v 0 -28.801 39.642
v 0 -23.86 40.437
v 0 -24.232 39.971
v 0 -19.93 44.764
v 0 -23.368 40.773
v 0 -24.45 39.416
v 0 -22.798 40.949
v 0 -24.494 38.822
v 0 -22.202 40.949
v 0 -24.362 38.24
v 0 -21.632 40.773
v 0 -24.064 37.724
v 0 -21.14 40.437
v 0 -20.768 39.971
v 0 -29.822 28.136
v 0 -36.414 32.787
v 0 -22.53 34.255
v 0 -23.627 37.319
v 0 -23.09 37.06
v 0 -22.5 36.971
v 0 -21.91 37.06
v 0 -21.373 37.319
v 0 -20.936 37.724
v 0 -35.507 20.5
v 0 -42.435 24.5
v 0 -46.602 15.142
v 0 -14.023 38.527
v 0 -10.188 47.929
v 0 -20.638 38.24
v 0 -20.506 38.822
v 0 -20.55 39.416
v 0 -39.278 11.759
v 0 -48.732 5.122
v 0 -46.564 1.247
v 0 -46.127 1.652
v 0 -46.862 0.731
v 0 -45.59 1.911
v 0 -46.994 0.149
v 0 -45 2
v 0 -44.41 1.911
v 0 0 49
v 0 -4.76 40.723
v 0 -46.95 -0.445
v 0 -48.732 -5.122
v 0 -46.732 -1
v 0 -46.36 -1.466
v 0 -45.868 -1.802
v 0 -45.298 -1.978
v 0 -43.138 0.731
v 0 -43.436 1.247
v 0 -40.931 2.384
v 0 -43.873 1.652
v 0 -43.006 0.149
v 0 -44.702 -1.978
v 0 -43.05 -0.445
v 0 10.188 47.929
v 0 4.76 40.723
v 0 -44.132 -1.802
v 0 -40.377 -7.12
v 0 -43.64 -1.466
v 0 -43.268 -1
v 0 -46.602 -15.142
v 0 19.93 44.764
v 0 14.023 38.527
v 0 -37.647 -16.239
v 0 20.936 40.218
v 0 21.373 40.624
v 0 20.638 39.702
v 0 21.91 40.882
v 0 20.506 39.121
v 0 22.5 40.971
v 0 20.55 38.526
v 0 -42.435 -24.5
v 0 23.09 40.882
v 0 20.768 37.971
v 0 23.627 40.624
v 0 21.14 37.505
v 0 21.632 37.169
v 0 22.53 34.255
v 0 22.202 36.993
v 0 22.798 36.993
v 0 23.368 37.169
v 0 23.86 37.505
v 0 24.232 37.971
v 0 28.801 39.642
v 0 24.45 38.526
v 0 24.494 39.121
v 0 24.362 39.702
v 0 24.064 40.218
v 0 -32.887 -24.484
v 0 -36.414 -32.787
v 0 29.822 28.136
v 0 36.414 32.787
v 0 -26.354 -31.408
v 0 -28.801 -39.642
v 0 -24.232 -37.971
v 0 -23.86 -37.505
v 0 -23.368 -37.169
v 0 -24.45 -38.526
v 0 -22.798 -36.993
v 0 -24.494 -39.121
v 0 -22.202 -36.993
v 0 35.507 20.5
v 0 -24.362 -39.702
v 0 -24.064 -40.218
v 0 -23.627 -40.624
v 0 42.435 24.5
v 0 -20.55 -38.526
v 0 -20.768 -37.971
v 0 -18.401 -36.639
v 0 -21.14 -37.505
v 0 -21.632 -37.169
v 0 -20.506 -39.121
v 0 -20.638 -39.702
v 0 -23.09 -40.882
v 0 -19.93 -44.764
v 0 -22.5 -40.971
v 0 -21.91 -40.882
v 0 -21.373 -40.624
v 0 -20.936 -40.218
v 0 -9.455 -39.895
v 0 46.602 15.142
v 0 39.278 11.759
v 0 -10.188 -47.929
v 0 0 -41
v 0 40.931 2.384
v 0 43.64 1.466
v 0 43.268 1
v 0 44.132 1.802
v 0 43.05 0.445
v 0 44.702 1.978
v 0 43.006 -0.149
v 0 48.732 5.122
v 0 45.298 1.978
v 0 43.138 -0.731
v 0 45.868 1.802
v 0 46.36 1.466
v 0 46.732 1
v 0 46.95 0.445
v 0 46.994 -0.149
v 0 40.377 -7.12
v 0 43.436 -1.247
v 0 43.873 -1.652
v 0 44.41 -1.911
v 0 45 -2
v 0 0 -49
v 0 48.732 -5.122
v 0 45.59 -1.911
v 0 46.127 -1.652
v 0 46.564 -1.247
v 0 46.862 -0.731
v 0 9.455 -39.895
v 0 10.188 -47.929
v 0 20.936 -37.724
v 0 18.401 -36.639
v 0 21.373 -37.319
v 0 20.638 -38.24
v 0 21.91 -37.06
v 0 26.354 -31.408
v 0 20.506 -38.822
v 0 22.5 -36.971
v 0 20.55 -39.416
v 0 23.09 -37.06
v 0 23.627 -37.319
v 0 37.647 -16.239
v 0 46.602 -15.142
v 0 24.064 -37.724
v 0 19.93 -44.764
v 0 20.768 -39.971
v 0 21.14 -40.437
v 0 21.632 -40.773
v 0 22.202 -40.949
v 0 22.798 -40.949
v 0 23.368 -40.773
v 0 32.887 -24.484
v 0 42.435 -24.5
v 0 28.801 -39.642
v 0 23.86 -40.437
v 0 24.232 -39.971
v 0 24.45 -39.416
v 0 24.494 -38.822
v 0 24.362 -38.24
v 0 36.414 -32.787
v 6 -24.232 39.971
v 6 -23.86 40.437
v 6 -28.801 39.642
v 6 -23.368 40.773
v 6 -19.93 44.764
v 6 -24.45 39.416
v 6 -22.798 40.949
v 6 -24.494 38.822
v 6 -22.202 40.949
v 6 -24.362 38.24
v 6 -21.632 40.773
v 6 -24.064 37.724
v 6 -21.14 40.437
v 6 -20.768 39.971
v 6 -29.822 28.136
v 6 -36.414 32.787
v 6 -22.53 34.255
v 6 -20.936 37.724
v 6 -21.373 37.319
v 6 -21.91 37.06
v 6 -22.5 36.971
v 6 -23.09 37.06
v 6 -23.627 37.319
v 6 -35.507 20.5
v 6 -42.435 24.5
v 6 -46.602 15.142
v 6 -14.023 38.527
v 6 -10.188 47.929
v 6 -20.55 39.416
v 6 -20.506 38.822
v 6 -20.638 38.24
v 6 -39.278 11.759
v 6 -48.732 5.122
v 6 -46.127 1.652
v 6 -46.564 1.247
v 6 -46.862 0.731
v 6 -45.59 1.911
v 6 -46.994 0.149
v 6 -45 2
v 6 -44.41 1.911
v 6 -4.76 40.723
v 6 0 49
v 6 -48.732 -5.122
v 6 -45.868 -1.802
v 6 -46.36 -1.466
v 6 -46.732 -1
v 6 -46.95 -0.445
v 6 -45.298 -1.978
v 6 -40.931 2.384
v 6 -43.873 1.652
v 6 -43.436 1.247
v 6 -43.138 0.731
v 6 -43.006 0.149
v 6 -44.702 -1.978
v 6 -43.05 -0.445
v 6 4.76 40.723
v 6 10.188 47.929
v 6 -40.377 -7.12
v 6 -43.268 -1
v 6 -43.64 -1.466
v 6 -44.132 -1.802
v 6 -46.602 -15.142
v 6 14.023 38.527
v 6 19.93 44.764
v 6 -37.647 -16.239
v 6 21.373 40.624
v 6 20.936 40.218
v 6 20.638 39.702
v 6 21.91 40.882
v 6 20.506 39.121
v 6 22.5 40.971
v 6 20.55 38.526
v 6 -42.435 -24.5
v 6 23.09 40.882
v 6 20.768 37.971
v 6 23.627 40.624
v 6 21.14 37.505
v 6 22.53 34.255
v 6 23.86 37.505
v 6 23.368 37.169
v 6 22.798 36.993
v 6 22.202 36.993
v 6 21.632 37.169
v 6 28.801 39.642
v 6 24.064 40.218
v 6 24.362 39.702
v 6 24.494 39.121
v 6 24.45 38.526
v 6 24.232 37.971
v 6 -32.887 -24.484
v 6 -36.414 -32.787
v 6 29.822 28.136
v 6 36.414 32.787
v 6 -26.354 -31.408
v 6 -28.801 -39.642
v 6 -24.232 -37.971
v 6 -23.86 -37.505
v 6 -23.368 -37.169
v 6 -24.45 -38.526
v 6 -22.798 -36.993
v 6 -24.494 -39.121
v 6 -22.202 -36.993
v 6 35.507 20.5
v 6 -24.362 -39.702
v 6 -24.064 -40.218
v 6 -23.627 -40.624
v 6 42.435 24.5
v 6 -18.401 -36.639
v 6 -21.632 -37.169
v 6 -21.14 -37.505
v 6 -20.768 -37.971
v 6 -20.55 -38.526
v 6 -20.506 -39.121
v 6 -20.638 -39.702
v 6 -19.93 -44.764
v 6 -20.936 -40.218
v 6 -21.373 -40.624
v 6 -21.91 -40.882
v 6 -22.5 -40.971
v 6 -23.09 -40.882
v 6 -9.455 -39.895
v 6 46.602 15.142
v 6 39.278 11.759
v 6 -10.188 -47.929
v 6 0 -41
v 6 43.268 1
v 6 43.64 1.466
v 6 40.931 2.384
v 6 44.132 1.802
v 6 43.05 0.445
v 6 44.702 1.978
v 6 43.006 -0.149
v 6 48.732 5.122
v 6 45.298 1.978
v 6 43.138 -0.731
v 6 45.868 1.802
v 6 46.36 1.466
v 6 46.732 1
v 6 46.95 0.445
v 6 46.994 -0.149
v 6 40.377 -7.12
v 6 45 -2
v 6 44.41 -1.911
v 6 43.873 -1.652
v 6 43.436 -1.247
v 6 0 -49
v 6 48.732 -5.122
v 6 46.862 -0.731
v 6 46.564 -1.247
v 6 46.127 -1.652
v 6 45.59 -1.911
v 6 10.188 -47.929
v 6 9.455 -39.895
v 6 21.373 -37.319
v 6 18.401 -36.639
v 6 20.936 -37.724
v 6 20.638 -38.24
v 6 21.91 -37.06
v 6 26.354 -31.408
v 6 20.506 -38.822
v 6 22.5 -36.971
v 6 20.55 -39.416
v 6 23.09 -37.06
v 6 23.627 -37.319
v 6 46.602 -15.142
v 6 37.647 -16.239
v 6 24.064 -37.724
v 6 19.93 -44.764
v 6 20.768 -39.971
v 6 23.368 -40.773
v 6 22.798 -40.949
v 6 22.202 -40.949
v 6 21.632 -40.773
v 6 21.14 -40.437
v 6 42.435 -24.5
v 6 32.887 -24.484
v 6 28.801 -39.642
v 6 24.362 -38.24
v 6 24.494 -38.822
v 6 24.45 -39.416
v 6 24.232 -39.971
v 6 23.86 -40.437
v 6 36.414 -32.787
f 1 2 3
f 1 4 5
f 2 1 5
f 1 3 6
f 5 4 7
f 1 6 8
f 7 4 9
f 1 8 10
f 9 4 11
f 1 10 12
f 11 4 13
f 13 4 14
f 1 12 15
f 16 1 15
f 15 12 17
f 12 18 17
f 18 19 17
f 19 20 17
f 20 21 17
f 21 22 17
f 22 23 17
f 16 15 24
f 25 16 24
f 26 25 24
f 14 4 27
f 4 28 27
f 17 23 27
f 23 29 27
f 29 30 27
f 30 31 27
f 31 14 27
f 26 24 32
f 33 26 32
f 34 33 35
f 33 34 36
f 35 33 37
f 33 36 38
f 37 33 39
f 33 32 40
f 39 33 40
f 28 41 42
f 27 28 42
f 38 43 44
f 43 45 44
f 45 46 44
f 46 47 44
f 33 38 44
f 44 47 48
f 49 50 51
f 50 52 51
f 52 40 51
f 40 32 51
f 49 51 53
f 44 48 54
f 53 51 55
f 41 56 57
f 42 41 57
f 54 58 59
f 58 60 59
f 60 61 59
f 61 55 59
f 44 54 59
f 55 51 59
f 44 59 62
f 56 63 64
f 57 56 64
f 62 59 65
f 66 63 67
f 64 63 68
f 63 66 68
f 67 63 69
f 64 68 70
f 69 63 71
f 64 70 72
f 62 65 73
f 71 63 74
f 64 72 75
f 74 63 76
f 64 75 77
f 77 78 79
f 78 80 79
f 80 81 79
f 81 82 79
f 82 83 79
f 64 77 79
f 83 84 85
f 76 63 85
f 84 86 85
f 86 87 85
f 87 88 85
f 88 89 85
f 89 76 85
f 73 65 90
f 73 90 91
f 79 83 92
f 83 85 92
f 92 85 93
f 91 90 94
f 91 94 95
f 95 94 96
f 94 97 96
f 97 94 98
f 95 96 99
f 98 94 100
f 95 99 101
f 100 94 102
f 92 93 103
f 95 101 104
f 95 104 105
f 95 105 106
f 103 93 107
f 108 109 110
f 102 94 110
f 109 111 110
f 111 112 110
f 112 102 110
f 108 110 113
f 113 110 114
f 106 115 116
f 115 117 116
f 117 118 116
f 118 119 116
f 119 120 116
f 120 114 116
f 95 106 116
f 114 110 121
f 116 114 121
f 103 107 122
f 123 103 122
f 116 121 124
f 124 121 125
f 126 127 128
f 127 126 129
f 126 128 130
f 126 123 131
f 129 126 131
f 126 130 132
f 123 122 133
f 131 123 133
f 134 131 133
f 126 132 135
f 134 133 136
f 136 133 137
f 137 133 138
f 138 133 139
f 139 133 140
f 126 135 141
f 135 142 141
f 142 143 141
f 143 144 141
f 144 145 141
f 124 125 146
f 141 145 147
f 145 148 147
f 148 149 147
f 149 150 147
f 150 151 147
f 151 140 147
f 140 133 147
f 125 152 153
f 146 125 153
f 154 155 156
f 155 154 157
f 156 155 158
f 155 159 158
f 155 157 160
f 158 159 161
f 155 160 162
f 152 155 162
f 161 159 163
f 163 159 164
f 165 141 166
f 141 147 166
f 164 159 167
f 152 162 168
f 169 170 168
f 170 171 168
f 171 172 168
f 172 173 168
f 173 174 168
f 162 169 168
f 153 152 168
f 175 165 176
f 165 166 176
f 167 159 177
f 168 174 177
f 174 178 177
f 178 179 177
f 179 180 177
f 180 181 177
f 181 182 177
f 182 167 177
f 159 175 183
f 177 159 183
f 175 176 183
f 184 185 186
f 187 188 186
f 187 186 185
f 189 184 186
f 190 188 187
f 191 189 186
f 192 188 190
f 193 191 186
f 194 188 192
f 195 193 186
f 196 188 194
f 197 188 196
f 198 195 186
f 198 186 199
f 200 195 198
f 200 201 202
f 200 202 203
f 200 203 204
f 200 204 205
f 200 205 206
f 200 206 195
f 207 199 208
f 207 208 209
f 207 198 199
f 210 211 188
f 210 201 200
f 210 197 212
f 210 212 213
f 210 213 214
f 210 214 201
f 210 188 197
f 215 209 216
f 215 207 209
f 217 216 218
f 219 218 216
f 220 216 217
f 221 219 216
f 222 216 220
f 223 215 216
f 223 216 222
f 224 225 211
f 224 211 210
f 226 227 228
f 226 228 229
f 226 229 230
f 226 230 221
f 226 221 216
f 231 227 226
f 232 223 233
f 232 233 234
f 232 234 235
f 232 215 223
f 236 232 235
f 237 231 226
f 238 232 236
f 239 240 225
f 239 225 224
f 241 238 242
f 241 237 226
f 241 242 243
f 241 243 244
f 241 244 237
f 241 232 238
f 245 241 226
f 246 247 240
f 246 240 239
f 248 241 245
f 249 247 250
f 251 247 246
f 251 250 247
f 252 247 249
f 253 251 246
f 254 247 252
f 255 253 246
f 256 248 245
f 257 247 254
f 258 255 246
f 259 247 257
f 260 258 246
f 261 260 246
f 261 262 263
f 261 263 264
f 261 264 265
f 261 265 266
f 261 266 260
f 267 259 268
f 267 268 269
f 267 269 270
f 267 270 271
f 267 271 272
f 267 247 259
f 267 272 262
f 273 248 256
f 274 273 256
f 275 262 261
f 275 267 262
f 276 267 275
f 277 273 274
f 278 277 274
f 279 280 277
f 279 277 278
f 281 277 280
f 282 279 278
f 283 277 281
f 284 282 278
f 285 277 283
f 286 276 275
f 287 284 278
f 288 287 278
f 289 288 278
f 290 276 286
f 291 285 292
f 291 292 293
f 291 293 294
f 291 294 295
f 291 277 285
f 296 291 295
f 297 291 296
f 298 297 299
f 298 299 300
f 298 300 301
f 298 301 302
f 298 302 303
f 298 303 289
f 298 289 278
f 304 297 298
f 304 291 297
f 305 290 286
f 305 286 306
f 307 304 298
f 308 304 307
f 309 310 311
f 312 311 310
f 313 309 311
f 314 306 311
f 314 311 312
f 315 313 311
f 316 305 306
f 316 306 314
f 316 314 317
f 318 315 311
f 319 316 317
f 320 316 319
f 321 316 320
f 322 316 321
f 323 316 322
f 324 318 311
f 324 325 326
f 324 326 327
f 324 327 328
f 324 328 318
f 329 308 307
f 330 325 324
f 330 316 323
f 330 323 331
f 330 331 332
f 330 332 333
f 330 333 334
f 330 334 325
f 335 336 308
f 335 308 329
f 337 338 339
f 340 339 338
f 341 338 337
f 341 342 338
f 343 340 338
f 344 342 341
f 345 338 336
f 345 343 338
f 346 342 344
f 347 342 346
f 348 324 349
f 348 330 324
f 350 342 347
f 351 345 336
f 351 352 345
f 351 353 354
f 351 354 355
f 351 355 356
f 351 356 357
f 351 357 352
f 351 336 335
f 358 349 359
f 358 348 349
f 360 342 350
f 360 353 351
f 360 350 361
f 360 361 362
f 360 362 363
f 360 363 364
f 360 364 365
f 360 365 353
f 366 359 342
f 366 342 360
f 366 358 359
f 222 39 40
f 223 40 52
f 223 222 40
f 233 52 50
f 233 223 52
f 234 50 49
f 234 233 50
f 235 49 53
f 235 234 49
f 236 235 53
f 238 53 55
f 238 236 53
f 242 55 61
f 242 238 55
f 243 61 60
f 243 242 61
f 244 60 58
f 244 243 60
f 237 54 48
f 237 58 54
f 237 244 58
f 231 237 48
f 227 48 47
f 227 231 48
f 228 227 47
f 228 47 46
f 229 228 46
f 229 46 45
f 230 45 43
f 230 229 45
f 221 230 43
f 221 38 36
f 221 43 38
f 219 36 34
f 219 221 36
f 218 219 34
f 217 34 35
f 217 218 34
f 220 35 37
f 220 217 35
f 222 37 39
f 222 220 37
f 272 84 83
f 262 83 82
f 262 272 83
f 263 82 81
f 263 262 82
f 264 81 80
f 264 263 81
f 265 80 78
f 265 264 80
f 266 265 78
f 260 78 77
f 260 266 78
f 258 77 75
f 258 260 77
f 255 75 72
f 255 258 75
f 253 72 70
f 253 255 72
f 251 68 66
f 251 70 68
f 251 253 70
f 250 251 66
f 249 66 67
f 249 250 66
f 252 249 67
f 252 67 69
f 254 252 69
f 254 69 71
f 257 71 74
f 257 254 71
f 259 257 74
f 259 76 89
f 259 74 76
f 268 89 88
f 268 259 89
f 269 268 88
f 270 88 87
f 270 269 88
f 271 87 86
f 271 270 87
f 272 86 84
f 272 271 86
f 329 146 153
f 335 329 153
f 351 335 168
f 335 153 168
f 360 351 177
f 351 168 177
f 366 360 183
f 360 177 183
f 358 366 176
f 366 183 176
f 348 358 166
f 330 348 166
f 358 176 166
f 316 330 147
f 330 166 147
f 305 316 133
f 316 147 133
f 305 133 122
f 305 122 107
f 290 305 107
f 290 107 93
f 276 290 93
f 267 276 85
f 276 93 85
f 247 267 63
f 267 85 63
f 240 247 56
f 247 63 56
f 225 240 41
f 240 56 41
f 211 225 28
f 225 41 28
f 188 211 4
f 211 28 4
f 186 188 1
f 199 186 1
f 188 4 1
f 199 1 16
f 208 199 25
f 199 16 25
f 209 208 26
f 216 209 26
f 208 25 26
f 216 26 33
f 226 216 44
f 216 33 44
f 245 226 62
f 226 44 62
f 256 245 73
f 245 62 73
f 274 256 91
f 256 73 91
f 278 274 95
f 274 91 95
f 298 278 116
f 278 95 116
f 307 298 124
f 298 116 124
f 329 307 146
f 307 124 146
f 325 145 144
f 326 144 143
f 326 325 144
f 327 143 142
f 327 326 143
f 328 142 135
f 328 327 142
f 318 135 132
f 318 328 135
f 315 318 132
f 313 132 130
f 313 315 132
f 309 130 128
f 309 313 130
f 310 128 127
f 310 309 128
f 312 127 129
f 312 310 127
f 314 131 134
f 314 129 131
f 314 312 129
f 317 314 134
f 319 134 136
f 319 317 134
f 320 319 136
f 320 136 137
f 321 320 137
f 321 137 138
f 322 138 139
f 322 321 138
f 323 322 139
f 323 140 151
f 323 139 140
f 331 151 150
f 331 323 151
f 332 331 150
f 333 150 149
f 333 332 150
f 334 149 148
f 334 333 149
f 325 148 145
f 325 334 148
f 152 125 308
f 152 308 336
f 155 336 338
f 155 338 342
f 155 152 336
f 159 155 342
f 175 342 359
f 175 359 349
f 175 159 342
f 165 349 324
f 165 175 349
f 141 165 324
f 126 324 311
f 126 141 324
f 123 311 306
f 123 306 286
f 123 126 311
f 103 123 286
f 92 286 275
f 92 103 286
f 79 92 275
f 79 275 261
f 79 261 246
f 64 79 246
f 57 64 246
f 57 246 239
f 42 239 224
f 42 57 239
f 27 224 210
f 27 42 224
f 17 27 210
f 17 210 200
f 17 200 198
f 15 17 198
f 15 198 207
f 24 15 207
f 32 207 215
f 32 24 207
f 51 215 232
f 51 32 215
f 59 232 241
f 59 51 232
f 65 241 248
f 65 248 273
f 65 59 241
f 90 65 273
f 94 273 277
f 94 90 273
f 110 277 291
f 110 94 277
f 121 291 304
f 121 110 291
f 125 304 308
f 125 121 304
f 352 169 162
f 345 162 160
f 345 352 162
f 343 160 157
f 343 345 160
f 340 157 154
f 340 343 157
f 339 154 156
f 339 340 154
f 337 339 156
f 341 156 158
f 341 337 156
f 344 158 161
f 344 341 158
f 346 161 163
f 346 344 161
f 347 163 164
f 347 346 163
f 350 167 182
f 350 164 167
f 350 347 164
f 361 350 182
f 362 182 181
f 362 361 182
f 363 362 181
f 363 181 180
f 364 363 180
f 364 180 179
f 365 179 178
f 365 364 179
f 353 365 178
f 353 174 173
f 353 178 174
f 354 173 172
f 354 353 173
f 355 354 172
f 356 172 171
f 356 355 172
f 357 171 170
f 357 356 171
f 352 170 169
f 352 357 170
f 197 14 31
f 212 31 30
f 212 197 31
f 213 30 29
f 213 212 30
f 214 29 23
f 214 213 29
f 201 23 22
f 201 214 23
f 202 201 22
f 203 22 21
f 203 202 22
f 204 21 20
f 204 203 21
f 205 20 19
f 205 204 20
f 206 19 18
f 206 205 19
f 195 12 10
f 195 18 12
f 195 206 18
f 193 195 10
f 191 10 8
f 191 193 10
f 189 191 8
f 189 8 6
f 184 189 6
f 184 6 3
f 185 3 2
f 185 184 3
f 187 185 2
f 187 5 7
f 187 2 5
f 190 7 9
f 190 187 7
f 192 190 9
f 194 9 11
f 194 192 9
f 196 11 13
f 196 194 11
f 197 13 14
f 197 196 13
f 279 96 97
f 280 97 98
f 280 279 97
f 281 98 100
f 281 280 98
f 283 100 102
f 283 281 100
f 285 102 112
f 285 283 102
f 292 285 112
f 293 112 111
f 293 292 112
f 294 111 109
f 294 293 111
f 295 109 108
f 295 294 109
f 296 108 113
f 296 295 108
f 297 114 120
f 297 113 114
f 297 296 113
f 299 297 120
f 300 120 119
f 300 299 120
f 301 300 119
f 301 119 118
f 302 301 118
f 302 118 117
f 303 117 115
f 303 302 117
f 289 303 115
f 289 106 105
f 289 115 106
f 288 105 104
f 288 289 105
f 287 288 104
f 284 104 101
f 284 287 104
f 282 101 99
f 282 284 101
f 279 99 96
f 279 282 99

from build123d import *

# Parameters (mm, degrees)
SKETCH1_R           = 49
SKETCH1_R_2         = 41
BOSS_EXTRUDE1_DEPTH = 6
CIRPATTERN1_COUNT   = 6


with BuildPart() as part:
    # Sketch1 → Boss-Extrude1 (new body)
    with BuildSketch(Plane(origin=(0, 0, 0), x_dir=(0, 0, -1), z_dir=(1, 0, 0))):
        Circle(SKETCH1_R)
        Circle(SKETCH1_R_2, mode=Mode.SUBTRACT)
    extrude(amount=BOSS_EXTRUDE1_DEPTH)

    # Sketch3 → Ø4.0mm Dowel Hole1 (revolve, cut)
    with BuildSketch(Plane(origin=(6, 45, 0), x_dir=(0, 0, -1), z_dir=(0, 1, 0))):
        Polygon((0, 0), (0, 51.201721238), (2, 50), (2, 0), align=None)
    f_4_0mm_dowel_hole1 = revolve(axis=Axis((12.35, 45, 0), (-1, 0, 0)), mode=Mode.SUBTRACT)

    # CirPattern1: Ø4.0mm Dowel Hole1 ×6 about axis
    cirpattern1_axis = Axis((0, 0, 0), (1, 0, 0))
    for i in range(1, CIRPATTERN1_COUNT):
        add(f_4_0mm_dowel_hole1.rotate(cirpattern1_axis, i * 360 / CIRPATTERN1_COUNT), mode=Mode.SUBTRACT)


solid = part.part
